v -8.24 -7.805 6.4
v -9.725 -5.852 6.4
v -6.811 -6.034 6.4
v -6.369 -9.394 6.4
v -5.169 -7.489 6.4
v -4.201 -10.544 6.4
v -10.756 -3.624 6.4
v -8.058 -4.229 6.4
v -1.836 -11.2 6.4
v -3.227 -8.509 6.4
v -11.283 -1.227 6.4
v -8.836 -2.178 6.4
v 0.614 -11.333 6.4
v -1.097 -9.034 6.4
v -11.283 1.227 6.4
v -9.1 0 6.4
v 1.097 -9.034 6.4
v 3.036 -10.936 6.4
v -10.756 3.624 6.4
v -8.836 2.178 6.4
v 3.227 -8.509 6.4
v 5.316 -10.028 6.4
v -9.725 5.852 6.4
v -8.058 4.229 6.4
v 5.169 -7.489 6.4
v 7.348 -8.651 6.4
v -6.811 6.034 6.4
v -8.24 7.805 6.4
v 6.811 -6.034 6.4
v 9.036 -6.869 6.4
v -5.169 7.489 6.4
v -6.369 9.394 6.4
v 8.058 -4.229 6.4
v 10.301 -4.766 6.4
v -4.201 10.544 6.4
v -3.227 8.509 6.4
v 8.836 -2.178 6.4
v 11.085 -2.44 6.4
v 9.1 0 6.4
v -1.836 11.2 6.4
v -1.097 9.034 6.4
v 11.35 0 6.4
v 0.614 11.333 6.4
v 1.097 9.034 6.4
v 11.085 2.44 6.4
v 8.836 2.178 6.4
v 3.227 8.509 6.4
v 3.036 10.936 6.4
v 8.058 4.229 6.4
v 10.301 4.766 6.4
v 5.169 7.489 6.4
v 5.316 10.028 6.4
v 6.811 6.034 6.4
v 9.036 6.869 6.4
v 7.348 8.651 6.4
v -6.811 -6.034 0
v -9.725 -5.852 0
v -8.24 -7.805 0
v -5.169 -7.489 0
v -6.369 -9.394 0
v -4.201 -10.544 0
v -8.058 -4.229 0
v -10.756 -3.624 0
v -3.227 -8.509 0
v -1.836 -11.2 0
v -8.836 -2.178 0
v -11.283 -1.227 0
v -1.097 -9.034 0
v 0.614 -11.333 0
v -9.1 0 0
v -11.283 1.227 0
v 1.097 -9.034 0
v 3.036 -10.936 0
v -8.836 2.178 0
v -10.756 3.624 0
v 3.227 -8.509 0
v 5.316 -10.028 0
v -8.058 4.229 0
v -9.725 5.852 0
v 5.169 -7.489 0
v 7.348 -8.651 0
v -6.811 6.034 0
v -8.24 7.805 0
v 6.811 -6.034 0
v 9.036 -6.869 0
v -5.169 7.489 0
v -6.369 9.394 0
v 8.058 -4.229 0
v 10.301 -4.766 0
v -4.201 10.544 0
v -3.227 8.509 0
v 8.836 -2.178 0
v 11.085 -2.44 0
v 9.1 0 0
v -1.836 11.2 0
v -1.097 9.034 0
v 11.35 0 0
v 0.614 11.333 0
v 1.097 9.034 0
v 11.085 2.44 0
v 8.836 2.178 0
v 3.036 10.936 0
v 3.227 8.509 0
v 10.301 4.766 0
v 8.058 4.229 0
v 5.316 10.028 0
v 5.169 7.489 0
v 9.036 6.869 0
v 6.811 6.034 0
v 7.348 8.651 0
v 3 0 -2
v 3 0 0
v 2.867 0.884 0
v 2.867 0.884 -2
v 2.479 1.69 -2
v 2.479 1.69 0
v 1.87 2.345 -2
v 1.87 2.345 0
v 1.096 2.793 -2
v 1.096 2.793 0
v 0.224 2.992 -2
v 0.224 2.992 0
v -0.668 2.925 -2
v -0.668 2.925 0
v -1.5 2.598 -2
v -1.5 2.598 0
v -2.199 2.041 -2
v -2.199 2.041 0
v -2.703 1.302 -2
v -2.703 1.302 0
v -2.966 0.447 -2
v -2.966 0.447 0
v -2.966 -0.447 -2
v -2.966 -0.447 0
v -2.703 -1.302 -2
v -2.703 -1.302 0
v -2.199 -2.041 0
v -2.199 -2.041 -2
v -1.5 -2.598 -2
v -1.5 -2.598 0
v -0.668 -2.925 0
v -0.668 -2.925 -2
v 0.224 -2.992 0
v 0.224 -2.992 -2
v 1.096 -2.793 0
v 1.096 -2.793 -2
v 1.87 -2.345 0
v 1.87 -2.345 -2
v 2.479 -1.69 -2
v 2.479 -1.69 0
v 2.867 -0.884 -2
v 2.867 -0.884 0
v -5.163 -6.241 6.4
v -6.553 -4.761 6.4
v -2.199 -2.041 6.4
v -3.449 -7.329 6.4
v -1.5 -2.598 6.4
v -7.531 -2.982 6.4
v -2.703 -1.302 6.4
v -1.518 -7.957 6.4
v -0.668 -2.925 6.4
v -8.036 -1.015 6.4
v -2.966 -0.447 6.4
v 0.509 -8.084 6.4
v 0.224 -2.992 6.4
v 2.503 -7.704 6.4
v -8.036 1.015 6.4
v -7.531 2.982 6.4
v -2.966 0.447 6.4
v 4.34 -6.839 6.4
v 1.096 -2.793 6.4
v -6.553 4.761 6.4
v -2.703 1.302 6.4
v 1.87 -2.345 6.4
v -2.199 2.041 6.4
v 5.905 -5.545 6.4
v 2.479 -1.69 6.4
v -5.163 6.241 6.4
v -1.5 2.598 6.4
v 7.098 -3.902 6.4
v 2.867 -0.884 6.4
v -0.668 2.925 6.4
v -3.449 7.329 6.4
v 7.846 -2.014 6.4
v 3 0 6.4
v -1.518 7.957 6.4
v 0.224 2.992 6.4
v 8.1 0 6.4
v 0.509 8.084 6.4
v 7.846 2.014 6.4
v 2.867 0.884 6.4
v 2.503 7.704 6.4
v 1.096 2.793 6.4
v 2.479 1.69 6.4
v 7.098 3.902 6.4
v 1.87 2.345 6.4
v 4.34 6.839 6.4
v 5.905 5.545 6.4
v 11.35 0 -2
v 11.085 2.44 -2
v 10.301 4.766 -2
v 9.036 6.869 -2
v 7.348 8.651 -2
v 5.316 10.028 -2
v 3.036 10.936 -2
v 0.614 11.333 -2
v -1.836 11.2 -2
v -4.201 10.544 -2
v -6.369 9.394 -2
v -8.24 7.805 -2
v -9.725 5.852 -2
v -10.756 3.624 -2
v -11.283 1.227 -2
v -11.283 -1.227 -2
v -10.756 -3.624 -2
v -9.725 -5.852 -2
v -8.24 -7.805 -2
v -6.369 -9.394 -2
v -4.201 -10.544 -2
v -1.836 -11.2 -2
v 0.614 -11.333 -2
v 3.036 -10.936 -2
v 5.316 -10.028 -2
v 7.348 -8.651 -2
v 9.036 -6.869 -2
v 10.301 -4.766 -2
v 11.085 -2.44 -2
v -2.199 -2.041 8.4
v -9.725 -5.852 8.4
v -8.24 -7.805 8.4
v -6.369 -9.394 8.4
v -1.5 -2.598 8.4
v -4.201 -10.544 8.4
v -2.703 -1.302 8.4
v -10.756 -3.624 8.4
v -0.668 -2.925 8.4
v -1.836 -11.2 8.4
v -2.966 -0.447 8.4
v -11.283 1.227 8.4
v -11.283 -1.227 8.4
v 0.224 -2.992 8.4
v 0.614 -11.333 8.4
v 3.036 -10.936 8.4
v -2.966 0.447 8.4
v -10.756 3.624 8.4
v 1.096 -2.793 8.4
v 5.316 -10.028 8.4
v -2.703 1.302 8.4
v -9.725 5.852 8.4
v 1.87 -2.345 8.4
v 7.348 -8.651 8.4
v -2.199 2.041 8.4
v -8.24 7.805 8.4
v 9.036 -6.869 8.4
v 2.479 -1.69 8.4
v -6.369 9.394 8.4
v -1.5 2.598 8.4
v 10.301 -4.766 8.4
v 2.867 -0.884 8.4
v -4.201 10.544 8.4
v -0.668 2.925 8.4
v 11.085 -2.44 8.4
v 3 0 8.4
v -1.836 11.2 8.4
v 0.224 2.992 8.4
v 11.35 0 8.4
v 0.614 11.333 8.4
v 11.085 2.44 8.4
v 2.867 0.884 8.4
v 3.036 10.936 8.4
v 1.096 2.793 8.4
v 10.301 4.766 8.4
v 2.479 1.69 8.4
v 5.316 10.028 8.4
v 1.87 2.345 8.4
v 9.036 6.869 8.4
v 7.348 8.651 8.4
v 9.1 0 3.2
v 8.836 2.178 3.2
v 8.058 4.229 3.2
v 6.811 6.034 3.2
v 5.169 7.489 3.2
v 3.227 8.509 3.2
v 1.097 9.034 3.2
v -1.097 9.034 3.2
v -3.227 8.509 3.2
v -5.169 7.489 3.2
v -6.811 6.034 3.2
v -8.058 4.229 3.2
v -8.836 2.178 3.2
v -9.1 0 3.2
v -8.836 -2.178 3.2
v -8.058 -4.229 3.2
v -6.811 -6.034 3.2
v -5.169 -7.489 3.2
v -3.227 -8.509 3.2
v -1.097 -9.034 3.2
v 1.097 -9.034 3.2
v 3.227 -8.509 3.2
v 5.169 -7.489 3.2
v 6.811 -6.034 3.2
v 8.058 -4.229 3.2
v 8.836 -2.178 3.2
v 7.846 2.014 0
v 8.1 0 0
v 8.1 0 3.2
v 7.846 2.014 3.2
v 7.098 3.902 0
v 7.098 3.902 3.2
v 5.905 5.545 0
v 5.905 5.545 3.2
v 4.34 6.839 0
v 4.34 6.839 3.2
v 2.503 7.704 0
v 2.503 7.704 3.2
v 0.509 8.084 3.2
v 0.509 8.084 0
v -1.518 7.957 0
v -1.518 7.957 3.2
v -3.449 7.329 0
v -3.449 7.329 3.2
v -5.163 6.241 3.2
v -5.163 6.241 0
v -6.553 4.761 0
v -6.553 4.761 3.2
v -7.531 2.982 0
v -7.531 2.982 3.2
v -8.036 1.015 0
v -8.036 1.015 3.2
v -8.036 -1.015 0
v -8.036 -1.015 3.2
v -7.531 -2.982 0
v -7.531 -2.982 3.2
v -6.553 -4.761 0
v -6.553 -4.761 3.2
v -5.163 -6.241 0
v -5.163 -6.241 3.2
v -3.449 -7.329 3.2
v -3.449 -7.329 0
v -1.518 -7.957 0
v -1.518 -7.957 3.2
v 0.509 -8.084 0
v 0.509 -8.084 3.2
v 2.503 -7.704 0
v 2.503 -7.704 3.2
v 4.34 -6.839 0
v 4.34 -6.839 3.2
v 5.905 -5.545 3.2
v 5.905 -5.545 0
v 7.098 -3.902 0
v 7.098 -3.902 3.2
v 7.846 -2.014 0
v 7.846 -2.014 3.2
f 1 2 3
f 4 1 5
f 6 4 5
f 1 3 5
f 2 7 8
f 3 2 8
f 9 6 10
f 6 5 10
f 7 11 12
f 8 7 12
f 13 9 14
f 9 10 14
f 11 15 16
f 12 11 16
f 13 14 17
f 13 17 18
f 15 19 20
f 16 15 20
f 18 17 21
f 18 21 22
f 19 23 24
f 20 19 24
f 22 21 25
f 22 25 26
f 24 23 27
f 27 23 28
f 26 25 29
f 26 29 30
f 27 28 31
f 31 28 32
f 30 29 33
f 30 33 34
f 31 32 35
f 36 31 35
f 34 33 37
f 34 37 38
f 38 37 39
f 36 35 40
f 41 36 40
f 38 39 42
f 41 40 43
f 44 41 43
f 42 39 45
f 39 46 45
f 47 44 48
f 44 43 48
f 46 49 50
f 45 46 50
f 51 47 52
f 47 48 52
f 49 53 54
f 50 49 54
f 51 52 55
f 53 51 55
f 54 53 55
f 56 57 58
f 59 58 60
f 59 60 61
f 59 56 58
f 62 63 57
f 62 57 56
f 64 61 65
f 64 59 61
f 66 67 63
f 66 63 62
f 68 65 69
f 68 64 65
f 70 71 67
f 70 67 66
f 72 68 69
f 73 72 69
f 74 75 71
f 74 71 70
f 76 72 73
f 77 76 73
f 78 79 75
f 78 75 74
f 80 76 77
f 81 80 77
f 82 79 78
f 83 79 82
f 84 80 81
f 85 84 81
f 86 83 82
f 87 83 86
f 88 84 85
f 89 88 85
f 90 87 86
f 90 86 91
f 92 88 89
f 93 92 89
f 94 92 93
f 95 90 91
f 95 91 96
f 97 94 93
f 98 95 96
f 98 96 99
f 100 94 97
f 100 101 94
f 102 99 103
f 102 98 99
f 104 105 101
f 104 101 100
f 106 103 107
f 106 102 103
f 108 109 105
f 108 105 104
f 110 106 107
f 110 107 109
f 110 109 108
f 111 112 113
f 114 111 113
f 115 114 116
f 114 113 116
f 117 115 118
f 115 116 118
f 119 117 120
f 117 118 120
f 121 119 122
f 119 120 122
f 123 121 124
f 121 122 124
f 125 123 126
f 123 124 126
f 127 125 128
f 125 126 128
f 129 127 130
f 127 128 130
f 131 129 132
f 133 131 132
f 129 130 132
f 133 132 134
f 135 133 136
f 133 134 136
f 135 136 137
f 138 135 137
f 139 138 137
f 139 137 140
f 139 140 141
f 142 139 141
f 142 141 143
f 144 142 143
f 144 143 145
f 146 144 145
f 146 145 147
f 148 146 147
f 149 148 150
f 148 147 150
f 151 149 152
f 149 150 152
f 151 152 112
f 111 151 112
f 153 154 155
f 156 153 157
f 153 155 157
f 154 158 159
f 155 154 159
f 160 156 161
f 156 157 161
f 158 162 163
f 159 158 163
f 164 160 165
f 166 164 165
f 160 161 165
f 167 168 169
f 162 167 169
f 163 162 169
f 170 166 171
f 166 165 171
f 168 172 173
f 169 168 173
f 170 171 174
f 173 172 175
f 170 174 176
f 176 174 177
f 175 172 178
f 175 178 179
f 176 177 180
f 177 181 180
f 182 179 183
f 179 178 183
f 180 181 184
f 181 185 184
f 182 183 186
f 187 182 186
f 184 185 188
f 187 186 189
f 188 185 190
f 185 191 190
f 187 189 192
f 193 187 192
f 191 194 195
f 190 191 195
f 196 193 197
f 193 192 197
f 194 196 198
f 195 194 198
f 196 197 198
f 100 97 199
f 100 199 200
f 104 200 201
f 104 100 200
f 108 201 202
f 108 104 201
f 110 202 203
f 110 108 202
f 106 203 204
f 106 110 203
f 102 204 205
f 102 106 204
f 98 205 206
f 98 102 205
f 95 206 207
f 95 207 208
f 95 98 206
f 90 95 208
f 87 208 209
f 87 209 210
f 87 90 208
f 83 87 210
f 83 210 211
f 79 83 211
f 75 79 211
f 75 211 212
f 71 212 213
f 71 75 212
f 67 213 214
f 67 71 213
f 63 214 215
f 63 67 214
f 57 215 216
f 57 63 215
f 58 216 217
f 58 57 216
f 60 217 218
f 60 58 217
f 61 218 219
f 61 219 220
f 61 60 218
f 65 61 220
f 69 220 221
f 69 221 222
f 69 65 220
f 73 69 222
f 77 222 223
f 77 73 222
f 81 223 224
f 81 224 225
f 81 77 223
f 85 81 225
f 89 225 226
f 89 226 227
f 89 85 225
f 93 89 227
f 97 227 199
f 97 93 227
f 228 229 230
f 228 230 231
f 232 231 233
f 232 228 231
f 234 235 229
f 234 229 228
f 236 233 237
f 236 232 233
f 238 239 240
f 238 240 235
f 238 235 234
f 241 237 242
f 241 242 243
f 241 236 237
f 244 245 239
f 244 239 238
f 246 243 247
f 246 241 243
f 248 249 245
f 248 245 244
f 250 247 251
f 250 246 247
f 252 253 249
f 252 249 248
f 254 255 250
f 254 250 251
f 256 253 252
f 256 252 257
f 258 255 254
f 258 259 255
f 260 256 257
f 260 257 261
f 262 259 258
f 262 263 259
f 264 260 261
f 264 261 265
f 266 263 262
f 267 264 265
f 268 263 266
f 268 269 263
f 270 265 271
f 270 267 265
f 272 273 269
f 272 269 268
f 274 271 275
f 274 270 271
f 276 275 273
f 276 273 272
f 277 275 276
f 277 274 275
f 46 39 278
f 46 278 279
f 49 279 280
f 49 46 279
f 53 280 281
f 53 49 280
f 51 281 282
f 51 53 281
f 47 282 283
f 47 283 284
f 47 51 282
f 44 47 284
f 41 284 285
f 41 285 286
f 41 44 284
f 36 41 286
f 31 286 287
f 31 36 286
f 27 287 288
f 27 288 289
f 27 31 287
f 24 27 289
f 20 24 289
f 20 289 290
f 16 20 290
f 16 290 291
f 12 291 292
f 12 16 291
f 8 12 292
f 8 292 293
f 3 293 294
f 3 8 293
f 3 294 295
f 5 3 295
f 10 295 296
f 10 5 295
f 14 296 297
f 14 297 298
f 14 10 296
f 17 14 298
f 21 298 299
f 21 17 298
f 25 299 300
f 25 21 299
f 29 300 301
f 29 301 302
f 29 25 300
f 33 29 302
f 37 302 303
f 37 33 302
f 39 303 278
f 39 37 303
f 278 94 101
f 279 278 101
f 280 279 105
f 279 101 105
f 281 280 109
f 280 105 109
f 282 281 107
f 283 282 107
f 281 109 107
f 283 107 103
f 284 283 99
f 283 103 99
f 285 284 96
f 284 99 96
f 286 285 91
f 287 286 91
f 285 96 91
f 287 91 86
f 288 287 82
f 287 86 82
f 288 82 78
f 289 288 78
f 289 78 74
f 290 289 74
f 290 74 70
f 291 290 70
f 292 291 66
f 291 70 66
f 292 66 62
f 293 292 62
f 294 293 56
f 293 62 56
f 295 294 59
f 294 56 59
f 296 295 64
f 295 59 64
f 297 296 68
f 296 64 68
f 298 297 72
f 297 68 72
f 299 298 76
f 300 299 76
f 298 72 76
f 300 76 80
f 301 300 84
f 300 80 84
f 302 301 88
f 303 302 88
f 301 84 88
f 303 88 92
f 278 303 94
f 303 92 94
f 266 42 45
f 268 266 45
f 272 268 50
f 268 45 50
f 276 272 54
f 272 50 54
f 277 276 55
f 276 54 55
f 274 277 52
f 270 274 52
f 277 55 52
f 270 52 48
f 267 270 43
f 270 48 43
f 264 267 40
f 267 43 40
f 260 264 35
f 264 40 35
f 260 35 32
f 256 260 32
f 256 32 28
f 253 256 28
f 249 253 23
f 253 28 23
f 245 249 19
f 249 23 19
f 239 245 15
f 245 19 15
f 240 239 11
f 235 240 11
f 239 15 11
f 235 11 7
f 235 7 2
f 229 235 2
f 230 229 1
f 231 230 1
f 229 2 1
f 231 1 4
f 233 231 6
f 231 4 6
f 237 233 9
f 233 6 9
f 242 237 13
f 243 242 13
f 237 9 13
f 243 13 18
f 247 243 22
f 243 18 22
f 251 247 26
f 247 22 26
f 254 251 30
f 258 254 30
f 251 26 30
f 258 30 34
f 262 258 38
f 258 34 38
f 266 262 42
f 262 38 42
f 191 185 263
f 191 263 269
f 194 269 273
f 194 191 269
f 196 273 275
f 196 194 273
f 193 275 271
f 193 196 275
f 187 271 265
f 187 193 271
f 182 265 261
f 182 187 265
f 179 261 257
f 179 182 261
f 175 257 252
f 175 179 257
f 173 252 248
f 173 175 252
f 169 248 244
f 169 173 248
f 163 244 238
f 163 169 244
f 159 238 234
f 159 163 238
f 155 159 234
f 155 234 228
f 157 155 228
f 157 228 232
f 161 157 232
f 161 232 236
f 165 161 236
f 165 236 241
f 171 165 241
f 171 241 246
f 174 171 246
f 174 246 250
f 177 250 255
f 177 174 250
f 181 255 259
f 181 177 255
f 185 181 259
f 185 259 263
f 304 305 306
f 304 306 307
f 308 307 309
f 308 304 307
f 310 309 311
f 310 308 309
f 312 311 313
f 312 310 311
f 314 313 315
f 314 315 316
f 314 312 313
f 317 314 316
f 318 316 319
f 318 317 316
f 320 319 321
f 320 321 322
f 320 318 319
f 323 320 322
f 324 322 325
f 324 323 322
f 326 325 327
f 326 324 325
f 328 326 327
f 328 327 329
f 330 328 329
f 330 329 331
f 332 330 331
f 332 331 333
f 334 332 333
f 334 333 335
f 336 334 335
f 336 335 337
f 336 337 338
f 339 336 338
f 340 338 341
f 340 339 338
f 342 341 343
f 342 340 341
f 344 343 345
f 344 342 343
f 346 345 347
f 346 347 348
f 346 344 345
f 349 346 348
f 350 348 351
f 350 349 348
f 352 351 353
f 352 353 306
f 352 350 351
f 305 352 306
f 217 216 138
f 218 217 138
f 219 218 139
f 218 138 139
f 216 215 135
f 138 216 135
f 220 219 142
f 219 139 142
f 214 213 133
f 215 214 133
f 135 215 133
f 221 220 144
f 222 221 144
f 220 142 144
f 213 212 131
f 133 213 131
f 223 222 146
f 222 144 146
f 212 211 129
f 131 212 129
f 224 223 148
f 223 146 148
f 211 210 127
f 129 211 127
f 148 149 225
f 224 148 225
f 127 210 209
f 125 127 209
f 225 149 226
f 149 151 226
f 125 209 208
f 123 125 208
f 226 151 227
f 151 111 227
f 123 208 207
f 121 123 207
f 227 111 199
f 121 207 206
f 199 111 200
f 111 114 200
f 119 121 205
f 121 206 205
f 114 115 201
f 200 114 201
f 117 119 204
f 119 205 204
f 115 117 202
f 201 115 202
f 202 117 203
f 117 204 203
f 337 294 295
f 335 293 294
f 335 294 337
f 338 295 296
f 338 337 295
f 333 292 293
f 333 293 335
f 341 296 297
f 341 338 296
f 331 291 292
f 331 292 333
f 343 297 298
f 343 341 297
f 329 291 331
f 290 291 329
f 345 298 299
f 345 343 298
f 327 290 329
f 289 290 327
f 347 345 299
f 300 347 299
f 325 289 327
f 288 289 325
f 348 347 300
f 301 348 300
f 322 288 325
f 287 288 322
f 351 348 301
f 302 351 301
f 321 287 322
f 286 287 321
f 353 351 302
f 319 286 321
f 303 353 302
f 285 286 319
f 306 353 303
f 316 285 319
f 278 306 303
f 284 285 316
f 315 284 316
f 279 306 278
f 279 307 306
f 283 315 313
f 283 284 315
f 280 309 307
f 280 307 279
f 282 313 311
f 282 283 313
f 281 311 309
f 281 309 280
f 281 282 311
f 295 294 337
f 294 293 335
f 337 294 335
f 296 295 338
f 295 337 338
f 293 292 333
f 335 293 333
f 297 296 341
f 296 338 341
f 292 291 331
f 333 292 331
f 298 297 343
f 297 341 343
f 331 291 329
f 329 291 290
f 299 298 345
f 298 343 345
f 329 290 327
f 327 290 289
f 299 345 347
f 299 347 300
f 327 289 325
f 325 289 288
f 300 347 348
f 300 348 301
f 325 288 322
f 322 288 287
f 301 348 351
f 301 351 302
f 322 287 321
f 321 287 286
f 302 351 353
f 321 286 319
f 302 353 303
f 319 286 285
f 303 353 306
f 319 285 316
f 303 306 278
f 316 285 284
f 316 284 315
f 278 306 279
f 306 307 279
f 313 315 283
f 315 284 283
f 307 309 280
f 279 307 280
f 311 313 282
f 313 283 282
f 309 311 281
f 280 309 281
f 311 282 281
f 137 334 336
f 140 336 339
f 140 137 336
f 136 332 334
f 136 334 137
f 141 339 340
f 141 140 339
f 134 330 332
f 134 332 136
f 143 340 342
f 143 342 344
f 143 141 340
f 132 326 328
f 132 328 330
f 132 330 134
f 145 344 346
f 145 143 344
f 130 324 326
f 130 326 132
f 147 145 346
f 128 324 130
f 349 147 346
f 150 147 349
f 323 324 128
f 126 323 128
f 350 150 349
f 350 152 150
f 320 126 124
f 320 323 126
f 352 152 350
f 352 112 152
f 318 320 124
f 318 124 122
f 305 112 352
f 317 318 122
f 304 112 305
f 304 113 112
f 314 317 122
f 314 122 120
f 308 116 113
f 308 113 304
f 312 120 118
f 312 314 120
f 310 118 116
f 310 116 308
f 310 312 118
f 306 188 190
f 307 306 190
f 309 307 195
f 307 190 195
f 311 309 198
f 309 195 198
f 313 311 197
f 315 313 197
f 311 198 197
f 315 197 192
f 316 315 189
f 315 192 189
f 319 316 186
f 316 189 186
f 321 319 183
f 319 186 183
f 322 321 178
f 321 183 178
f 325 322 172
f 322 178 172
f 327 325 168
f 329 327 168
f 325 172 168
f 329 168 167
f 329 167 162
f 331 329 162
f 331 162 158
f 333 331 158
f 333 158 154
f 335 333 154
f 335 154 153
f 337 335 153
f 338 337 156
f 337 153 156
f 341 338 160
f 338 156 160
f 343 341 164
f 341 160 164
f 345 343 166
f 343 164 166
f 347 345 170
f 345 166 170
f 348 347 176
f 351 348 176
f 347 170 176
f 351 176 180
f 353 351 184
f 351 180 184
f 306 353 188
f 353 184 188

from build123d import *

# Parameters (mm, degrees)
F0_R     = 11.35
F0_R_2   = 9.1
F0_R_3   = 8.1
F0_R_4   = 3
F1_DEPTH = 2
F2_DEPTH = 3.2


with BuildPart() as f1:
    # F0 (on Top) → F1 (new body)
    with BuildSketch(Plane.XY):
        Circle(F0_R)
        Circle(F0_R_2, mode=Mode.SUBTRACT)
        Circle(F0_R_2)
        Circle(F0_R_3, mode=Mode.SUBTRACT)
        Circle(F0_R_3)
        Circle(F0_R_4, mode=Mode.SUBTRACT)
    extrude(amount=-F1_DEPTH)

    # F0 (on Top) → F2 (join)
    with BuildSketch(Plane.XY):
        Circle(F0_R_2)
        Circle(F0_R_3, mode=Mode.SUBTRACT)
    extrude(amount=F2_DEPTH)


with BuildPart() as f3_1:
    # F3: instance of F1
    add(f1.part.mirror(Plane.XY.offset(3.2)))


solid = Compound([f1.part, f3_1.part])
